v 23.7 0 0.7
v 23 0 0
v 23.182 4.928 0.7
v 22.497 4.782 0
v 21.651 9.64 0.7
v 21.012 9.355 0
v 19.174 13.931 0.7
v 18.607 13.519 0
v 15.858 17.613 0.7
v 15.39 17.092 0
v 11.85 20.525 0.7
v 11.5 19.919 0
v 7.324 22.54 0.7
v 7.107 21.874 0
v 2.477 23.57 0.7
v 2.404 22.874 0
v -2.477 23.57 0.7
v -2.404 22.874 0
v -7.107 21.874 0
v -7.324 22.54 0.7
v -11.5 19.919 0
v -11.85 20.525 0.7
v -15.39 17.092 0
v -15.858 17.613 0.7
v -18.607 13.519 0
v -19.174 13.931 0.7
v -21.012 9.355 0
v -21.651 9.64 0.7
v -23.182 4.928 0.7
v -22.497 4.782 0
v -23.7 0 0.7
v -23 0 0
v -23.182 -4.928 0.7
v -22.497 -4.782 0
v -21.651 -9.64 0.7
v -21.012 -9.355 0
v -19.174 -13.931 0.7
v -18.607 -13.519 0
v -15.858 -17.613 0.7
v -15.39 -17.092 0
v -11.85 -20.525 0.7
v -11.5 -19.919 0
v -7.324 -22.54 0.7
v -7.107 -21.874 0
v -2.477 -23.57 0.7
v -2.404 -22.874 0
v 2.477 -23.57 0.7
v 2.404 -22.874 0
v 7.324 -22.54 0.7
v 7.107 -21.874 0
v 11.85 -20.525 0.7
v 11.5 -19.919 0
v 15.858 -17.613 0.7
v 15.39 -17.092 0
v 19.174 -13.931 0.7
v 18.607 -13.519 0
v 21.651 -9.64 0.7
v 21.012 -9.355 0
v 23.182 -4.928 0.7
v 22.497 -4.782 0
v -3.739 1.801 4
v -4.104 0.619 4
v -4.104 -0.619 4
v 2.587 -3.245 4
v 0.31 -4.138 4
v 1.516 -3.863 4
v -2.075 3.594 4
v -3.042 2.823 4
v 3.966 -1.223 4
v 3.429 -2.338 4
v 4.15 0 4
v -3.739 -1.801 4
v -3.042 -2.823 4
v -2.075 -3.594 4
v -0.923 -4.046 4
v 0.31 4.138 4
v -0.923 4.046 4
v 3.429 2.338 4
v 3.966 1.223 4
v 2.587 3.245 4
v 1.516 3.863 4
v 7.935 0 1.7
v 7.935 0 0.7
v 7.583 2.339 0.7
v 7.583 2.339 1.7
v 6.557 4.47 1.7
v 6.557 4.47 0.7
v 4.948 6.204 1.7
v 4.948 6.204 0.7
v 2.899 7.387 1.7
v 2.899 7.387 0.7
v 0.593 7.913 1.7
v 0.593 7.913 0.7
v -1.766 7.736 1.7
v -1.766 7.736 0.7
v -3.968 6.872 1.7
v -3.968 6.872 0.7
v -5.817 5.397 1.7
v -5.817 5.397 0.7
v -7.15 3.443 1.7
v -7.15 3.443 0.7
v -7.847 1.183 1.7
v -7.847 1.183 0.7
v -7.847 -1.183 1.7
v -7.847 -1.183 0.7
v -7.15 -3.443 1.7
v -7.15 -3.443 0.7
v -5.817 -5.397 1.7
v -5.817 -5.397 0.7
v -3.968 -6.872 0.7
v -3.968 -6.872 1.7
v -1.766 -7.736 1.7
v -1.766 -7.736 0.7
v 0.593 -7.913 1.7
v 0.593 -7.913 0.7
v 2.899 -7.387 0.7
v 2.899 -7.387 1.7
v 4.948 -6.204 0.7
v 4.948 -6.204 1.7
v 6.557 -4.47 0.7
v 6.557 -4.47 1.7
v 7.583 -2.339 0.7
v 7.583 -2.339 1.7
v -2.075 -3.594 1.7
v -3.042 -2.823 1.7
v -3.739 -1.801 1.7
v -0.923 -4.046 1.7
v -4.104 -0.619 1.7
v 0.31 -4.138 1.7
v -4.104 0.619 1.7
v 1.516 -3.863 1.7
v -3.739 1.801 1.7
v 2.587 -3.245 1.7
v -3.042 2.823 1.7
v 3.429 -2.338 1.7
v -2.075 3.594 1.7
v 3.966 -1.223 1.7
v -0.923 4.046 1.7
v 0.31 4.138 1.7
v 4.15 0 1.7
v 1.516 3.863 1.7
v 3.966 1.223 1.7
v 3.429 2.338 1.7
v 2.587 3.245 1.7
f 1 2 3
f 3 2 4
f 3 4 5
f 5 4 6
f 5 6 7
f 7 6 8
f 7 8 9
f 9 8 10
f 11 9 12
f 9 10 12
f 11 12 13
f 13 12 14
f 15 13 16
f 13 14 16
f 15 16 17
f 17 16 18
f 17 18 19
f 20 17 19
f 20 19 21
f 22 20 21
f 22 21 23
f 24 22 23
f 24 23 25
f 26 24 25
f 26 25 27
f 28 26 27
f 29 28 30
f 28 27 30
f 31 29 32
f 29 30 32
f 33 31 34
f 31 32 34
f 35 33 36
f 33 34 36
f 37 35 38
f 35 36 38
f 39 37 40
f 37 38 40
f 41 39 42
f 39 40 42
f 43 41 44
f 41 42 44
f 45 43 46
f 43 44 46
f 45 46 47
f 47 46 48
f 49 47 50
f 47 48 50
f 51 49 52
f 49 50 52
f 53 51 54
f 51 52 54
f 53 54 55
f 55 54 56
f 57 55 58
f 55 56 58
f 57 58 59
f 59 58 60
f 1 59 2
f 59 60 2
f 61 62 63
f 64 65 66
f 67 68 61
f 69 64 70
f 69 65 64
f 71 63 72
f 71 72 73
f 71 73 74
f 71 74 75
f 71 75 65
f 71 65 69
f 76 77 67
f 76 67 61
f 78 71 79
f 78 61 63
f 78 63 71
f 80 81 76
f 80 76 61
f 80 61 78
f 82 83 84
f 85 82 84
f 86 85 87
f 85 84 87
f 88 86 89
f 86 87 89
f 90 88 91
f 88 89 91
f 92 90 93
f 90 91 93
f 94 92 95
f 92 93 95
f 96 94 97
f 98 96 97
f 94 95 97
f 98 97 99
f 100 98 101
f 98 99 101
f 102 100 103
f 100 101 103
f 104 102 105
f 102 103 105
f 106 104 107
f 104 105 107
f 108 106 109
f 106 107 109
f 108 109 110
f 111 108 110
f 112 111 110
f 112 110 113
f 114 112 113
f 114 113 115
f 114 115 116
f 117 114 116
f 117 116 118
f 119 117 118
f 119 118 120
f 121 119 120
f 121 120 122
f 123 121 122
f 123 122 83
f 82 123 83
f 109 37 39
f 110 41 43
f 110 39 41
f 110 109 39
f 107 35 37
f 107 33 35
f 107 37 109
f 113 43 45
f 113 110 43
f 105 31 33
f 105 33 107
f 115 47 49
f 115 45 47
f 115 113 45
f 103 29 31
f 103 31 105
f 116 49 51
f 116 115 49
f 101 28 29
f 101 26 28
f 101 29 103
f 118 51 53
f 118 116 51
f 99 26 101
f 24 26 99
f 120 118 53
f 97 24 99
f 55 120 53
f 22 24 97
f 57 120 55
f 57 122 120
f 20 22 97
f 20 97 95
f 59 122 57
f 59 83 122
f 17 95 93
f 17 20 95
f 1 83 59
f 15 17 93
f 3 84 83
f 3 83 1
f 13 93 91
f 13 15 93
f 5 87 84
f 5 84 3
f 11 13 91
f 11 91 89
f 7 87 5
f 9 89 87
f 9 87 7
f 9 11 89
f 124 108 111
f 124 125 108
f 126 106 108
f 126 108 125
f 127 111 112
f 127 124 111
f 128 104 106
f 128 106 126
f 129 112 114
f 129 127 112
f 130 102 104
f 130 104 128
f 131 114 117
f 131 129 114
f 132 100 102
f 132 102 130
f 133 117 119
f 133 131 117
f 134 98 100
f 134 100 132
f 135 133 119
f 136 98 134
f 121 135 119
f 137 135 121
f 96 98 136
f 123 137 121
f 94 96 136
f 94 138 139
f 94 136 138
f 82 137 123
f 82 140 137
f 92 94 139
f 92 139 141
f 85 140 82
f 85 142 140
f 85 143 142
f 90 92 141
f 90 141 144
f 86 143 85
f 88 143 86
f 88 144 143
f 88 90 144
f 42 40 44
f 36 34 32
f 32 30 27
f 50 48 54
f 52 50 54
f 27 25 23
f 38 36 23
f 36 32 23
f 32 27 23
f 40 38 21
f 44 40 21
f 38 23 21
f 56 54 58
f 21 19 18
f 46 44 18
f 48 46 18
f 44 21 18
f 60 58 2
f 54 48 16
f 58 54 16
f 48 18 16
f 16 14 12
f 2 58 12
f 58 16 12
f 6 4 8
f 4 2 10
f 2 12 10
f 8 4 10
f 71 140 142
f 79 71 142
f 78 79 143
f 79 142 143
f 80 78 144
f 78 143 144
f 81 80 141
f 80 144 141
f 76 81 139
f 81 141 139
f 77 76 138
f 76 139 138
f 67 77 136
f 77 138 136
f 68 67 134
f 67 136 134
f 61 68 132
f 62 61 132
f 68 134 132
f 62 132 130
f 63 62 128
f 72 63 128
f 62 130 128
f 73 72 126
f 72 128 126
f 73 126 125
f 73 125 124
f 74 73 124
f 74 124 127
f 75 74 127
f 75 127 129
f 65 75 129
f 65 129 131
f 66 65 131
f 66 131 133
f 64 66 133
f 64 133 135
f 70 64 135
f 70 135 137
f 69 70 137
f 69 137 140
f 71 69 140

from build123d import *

# Parameters (mm, degrees)
F0_R     = 25
F0_R_2   = 7.9354206637
F1_DEPTH = 0.7
F0_R_3   = 4.15
F2_DEPTH = 1.7
F3_DEPTH = 4


# Not quite as in the source:
# - a fillet or chamfer that OpenCascade refuses, or shapes differently, is made with other operations: its cross-section is extruded or revolved along the edge and cut away or added


with BuildPart() as f1:
    # F0 (on Top) → F1 (new body)
    with BuildSketch(Plane.XY):
        Circle(F0_R)
        Circle(F0_R_2, mode=Mode.SUBTRACT)
    extrude(amount=F1_DEPTH)

    # F0 (on Top) → F2 (join)
    with BuildSketch(Plane.XY):
        Circle(F0_R_2)
        Circle(F0_R_3, mode=Mode.SUBTRACT)
    extrude(amount=F2_DEPTH)

    # F0 (on Top) → F3 (join)
    with BuildSketch(Plane.XY):
        Circle(F0_R_3)
    extrude(amount=F3_DEPTH)

    # F4: chamfer of 2 on 1 edges, made by hand

    # F4_s1 → F4_t2 (revolve, cut)
    with BuildSketch(Plane.XZ):
        Polygon((25, 2), (23, 0), (25, 0), align=None)
    revolve(axis=Axis((0, 0, 0), (0, 0, 1)), mode=Mode.SUBTRACT)


solid = f1.part
